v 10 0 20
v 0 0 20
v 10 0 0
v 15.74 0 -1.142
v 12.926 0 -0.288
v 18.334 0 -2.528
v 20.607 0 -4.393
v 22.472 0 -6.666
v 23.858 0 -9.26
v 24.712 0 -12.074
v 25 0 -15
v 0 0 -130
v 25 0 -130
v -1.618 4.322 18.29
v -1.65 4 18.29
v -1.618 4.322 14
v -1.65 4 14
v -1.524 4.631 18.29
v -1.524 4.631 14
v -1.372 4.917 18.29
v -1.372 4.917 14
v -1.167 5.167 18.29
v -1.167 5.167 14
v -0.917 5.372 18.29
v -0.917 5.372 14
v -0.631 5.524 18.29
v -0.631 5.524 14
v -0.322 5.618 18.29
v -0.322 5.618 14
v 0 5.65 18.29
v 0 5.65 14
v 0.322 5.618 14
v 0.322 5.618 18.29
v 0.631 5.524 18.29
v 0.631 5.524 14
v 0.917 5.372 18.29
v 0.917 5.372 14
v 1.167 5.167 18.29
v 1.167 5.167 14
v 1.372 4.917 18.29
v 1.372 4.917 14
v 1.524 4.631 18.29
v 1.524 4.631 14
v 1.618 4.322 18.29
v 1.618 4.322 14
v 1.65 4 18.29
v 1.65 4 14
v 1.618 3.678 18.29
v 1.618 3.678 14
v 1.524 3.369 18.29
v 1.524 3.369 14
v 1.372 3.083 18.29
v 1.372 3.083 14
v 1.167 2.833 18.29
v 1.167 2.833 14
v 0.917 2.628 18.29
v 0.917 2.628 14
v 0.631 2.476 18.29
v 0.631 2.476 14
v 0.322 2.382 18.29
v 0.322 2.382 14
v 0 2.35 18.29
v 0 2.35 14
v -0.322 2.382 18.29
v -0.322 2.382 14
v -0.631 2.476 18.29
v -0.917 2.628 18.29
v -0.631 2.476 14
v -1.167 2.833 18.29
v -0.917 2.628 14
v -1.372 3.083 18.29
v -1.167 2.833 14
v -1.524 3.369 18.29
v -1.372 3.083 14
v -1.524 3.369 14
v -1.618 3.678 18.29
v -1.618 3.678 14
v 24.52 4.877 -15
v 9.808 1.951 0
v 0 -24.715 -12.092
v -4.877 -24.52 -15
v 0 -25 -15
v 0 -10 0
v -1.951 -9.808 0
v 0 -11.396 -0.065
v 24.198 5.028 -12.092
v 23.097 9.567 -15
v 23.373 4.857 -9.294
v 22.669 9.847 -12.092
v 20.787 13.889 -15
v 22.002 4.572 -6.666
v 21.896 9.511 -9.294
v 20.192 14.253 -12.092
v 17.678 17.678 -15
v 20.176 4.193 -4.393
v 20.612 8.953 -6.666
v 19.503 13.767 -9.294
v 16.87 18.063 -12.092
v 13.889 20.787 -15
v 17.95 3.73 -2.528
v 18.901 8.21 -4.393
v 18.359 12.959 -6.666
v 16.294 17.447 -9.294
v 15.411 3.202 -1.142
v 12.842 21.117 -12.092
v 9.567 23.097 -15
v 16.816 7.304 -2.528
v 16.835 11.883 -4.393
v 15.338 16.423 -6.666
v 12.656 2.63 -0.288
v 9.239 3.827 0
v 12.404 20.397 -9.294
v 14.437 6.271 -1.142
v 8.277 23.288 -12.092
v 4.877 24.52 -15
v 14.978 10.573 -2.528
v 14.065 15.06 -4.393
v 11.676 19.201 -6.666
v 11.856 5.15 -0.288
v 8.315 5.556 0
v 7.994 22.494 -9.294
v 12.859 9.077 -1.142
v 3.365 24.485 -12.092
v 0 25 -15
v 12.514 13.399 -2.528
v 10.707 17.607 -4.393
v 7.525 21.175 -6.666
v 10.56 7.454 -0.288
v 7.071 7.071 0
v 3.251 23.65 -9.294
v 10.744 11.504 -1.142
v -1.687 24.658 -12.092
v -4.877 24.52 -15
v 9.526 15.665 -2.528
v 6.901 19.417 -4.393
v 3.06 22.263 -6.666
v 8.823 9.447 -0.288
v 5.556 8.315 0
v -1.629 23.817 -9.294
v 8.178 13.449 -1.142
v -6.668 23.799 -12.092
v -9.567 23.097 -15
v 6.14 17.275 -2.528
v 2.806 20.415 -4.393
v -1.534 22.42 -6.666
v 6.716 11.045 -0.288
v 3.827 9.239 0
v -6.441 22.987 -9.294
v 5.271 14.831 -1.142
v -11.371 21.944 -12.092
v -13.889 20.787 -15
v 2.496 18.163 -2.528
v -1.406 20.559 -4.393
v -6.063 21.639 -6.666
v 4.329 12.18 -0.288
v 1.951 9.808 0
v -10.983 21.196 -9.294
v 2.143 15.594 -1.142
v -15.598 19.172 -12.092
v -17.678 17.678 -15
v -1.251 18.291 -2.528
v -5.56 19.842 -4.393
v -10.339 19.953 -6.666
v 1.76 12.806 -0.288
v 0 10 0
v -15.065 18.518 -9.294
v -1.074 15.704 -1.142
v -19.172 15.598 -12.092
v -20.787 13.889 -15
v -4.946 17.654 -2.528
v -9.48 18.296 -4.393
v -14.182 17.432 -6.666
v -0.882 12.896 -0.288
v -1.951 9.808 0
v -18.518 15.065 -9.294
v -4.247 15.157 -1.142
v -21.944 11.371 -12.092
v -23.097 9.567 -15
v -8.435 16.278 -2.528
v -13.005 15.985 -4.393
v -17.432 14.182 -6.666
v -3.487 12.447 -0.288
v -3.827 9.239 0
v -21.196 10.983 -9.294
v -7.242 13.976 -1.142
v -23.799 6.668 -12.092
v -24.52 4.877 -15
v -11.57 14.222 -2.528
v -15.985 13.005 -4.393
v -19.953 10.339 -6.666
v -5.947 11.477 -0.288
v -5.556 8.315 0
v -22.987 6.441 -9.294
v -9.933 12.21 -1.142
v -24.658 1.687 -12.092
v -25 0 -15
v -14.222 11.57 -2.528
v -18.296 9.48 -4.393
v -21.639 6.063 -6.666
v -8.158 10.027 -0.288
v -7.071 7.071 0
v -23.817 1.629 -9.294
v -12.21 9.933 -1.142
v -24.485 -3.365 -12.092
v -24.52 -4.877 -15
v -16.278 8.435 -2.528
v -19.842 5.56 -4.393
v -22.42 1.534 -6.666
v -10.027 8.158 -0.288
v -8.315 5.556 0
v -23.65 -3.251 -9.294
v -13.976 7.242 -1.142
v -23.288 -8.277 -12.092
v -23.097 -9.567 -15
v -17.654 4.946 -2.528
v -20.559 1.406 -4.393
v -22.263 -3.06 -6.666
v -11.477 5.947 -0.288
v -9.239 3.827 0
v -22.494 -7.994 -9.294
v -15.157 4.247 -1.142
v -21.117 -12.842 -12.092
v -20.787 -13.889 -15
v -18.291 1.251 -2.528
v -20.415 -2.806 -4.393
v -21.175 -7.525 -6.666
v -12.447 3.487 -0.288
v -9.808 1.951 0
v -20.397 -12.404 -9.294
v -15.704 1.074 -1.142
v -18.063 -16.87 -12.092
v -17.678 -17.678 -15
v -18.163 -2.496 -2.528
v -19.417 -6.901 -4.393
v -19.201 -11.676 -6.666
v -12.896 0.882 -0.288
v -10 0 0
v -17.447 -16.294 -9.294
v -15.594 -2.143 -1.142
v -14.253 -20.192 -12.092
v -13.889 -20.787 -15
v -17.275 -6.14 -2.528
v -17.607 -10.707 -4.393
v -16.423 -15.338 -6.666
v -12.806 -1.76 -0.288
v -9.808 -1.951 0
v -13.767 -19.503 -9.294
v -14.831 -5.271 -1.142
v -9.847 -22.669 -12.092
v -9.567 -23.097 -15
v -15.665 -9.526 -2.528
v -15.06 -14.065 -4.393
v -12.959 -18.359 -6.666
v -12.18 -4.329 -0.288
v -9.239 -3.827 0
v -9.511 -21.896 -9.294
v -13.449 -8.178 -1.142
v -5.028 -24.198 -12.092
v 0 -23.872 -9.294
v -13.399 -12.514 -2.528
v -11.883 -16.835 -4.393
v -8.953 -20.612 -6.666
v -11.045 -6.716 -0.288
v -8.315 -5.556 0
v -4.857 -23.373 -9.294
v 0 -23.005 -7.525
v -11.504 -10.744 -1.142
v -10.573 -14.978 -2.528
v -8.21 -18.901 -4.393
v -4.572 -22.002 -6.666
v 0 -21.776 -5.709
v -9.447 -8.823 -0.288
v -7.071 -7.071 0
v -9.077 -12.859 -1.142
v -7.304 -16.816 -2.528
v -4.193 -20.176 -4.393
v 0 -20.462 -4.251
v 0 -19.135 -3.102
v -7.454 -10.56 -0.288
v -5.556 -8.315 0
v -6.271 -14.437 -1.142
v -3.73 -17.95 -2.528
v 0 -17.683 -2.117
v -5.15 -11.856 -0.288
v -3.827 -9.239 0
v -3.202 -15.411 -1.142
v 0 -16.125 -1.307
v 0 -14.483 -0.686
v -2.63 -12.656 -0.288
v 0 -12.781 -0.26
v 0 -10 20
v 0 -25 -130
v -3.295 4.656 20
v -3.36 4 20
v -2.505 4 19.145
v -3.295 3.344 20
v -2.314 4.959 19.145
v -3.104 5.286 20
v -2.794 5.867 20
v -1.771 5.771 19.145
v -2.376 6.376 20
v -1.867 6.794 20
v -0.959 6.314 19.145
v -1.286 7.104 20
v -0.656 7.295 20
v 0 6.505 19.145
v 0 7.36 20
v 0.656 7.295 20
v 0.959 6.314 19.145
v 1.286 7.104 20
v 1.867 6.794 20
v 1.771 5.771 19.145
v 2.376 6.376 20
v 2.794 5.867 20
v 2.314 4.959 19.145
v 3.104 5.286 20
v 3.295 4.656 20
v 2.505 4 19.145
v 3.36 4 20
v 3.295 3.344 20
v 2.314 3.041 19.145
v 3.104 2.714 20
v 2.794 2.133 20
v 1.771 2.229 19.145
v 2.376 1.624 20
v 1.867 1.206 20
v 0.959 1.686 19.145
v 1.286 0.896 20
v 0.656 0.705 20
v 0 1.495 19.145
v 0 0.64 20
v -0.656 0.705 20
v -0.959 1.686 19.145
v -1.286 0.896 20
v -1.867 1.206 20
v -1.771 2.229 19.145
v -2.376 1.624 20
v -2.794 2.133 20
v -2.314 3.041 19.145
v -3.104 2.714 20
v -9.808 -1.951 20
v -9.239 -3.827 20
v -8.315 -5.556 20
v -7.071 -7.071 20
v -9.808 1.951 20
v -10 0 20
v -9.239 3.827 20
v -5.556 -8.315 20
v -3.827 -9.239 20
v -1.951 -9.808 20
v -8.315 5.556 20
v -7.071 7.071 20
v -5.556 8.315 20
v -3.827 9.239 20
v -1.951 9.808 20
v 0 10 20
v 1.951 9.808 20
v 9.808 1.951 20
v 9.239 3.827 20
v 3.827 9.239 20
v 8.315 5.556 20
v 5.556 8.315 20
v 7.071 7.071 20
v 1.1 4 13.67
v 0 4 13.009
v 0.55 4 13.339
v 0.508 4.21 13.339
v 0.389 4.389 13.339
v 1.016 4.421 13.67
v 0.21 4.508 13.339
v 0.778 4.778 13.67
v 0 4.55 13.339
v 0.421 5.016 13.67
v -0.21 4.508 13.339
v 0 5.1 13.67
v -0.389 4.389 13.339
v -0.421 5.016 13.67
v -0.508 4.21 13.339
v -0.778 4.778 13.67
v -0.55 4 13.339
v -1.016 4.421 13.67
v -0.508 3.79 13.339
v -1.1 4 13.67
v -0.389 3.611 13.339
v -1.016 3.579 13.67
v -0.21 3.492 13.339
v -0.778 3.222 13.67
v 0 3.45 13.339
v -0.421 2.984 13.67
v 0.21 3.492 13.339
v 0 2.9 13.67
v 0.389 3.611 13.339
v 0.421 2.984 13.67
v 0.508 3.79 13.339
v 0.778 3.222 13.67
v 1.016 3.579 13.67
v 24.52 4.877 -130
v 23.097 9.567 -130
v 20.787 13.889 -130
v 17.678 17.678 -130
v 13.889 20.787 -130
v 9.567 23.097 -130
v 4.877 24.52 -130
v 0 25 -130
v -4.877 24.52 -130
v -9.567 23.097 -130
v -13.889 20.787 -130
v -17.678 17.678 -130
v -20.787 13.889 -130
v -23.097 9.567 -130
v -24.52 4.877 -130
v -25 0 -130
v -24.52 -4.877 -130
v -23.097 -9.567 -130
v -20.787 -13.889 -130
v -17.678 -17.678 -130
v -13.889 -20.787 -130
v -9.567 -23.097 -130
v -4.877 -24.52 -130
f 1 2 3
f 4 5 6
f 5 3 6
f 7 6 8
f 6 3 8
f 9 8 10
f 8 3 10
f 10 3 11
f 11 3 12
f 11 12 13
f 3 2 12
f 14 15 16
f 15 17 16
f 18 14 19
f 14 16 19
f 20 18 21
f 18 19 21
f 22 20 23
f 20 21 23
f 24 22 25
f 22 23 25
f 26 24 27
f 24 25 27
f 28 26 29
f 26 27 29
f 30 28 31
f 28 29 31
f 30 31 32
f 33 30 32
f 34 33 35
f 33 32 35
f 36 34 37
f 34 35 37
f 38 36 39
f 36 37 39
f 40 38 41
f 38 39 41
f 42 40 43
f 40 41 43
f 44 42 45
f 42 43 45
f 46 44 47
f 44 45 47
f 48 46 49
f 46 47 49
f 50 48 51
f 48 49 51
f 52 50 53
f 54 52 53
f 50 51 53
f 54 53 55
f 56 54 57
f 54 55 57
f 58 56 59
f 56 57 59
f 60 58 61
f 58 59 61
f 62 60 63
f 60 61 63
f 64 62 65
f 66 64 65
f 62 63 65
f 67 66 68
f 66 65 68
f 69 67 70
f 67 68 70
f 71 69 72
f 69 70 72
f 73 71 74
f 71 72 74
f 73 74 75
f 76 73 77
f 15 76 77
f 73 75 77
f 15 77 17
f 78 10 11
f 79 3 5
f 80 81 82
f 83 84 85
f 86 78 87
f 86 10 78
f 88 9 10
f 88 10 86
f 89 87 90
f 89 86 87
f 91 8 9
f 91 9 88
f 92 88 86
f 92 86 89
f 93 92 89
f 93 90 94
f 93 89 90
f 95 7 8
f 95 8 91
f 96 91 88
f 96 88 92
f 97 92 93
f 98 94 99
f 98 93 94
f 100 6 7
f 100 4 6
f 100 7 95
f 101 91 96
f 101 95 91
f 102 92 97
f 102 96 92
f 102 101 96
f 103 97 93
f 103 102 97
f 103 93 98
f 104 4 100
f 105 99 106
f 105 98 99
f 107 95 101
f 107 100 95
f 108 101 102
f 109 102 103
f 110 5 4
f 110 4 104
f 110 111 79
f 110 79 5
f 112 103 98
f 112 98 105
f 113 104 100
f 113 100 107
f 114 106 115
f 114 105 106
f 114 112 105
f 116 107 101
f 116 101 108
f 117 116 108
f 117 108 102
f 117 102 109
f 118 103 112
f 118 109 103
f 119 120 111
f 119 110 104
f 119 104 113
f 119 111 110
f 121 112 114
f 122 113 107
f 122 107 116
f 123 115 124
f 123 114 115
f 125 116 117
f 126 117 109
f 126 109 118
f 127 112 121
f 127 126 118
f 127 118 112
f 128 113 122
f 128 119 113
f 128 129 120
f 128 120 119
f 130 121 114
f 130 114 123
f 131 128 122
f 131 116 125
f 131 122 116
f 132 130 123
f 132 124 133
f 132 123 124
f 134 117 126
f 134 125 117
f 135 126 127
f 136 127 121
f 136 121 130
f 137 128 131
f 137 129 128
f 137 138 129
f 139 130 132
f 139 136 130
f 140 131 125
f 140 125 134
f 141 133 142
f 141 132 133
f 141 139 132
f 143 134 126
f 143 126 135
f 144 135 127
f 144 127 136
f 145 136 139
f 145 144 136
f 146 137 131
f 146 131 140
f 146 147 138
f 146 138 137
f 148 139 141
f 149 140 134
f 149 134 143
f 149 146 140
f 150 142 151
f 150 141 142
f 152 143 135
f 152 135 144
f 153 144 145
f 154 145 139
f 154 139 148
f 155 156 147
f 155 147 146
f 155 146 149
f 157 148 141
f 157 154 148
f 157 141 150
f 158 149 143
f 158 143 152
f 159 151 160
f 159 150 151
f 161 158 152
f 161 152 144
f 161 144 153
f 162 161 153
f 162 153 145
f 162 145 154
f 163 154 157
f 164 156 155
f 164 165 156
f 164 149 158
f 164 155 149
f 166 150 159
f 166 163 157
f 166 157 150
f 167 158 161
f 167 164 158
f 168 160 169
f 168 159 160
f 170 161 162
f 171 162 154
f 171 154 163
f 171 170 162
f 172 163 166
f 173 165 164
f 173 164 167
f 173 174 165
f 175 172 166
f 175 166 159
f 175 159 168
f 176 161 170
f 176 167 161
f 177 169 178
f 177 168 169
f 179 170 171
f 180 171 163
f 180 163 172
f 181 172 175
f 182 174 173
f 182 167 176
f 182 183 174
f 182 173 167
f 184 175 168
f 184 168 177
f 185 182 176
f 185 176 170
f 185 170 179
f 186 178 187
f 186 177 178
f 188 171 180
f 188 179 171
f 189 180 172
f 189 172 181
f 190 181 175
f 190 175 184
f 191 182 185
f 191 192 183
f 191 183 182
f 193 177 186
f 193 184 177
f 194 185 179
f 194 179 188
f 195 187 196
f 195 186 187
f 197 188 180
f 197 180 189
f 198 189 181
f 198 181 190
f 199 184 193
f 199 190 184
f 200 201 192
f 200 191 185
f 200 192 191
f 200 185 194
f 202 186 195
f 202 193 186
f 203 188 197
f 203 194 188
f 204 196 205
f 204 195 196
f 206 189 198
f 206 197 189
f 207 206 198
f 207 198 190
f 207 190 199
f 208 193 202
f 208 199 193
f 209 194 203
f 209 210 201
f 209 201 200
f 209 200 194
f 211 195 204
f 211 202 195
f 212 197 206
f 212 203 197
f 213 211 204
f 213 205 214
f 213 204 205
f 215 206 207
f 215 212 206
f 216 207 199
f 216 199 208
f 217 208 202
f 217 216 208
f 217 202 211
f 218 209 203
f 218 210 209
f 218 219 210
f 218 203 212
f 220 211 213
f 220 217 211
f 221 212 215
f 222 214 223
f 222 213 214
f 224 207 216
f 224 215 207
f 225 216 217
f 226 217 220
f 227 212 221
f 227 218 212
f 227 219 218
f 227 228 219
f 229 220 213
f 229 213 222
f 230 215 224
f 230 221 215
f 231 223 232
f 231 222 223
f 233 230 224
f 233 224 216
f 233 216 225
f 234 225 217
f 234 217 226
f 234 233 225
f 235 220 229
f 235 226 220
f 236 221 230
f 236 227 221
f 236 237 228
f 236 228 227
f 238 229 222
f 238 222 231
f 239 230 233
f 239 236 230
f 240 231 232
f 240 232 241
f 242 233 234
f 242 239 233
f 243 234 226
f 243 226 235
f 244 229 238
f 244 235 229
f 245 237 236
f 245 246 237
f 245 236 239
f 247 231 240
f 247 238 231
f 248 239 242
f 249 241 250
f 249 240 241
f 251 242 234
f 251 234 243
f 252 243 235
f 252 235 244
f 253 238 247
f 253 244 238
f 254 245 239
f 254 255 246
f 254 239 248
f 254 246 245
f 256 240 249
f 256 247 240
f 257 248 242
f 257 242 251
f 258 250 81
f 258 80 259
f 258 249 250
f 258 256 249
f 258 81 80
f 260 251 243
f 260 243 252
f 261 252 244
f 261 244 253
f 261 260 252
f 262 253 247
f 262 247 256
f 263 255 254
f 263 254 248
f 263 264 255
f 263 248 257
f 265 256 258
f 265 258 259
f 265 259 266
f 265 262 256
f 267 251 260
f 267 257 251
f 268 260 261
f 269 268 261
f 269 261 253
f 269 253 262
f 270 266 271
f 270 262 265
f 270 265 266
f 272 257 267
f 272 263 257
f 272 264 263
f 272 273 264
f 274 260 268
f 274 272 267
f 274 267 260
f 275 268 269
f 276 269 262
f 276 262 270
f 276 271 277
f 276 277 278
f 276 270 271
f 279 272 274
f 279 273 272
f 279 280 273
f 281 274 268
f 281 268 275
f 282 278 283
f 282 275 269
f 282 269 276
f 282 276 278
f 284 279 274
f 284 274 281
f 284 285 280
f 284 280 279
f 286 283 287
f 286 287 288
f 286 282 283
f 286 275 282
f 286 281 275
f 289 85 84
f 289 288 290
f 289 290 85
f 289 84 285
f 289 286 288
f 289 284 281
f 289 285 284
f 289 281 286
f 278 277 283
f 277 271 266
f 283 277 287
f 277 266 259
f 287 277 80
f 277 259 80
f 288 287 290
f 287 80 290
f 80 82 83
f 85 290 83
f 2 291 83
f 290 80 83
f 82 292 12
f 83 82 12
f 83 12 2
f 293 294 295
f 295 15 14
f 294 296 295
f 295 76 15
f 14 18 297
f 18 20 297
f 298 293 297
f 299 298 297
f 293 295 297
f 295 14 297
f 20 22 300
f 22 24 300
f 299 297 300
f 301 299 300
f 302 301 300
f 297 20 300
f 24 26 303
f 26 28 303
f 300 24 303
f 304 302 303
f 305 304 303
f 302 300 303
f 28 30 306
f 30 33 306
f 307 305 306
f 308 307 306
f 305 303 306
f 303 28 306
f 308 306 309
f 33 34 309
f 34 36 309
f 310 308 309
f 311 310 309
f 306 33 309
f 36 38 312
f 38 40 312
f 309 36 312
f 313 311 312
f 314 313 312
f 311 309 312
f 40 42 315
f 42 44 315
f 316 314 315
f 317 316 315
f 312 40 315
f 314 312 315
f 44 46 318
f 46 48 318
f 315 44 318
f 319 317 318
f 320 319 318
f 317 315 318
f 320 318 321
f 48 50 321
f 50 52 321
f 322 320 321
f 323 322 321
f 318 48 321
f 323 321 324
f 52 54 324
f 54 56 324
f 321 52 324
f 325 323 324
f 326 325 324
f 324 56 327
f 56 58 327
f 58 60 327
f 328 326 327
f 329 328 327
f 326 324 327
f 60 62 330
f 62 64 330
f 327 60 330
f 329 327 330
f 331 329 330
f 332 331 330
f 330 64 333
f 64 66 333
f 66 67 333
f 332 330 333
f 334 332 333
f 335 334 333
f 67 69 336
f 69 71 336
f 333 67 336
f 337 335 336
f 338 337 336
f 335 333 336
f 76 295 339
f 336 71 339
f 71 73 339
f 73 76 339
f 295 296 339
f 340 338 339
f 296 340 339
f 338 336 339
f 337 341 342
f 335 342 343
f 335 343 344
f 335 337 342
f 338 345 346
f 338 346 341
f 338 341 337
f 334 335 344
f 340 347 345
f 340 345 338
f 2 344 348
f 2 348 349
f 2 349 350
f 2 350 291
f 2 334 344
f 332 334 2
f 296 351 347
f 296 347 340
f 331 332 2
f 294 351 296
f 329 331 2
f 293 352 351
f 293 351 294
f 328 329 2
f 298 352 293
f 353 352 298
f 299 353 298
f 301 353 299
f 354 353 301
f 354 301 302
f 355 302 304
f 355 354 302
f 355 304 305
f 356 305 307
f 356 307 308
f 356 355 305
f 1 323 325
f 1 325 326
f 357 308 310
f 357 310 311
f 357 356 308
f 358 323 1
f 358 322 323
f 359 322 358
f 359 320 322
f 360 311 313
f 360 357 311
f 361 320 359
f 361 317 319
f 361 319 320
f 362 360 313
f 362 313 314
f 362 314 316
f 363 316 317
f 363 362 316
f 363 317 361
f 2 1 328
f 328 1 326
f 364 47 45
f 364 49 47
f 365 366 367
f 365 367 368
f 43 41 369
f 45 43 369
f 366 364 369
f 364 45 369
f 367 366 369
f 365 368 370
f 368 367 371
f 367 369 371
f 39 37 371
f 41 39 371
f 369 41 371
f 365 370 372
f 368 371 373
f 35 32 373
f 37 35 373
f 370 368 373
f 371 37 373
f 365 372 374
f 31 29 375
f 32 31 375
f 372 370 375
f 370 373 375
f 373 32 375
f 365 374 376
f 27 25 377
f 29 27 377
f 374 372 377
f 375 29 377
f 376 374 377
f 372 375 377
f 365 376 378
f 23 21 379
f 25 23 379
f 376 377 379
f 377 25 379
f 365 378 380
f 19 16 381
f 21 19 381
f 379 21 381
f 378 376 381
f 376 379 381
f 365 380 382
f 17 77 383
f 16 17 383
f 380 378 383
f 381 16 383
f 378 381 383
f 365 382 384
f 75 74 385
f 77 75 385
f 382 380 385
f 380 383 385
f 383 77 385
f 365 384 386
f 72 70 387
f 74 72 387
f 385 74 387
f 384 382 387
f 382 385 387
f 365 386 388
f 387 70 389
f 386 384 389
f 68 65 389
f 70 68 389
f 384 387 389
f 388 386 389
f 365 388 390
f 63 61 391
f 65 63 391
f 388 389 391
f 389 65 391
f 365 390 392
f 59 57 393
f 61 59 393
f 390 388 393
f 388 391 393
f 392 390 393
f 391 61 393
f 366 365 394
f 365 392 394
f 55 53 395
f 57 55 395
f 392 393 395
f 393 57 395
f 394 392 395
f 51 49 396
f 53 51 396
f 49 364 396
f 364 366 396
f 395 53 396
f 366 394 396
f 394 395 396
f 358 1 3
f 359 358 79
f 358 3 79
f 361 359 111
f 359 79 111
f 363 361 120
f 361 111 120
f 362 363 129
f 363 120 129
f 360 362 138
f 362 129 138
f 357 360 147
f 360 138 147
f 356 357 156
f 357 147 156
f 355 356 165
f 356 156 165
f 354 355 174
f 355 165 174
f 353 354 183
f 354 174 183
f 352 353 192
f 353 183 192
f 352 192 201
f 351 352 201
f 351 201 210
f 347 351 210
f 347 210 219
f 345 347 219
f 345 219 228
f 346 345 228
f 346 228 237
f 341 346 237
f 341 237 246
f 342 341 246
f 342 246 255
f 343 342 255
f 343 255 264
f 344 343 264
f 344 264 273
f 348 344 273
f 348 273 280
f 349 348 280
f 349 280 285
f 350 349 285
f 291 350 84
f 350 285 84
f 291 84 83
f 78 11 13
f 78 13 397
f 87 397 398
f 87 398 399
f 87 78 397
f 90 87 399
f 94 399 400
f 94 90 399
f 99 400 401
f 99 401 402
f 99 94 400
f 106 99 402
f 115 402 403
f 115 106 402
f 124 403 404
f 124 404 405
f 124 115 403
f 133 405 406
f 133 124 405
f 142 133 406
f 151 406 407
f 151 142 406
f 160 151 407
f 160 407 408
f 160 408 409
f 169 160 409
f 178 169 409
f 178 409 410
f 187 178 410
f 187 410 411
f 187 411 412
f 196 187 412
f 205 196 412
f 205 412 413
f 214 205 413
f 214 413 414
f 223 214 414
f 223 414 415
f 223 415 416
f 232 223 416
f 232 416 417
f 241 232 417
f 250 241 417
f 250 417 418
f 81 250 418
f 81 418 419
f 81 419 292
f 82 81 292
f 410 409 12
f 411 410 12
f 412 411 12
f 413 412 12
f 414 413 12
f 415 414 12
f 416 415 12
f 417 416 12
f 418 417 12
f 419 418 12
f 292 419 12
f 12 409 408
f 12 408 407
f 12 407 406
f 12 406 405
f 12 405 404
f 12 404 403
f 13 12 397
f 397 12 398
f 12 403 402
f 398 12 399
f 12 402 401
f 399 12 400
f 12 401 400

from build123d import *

# Parameters (mm, degrees)
F0_R           = 25
F0_R_2         = 10
F1_DEPTH       = 130
F2_R           = 15
F3_DEPTH       = 20
F4_W           = 74.8539417982
F4_H           = 49.5208390057
F5_DEPTH       = 20.001
F5_DEPTH_BACK  = 130.001
F7_D           = 3.3
F7_DEPTH       = 6
F7_CSINK_D     = 6.72
F7_CSINK_ANGLE = 90
F7_TIP         = 0.9914200214


with BuildPart() as f1:
    # F0 (on Top) → F1 (new body)
    with BuildSketch(Plane.XY):
        Circle(F0_R)
        Circle(F0_R_2, mode=Mode.SUBTRACT)
        Circle(F0_R_2)
    extrude(amount=-F1_DEPTH)

    # F2
    f2_edges = [f1.edges().sort_by_distance(p)[0] for p in [
        (-25, 0, 0),
    ]]
    fillet(f2_edges, radius=F2_R)

    # F0 (on Top) → F3 (join)
    with BuildSketch(Plane.XY):
        Circle(F0_R_2)
    extrude(amount=F3_DEPTH)

    # F4 (on Top) → F5 (cut, two sides)
    with BuildSketch(Plane.XY) as f5_sk:
        with Locations((37.4269708991, -24.7604195029)):
            Rectangle(F4_W, F4_H)
    extrude(amount=F5_DEPTH, mode=Mode.SUBTRACT)
    extrude(f5_sk.sketch, amount=-F5_DEPTH_BACK, mode=Mode.SUBTRACT)

    # F7
    with Locations(Plane.XY.offset(20)):
        with Locations((0, 4)):
            CounterSinkHole(F7_D / 2, F7_CSINK_D / 2, depth=F7_DEPTH, counter_sink_angle=F7_CSINK_ANGLE)
            with Locations((0, 0, -(F7_DEPTH + F7_TIP / 2))):  # 118° drill point
                Cone(0, F7_D / 2, F7_TIP, mode=Mode.SUBTRACT)


solid = f1.part
